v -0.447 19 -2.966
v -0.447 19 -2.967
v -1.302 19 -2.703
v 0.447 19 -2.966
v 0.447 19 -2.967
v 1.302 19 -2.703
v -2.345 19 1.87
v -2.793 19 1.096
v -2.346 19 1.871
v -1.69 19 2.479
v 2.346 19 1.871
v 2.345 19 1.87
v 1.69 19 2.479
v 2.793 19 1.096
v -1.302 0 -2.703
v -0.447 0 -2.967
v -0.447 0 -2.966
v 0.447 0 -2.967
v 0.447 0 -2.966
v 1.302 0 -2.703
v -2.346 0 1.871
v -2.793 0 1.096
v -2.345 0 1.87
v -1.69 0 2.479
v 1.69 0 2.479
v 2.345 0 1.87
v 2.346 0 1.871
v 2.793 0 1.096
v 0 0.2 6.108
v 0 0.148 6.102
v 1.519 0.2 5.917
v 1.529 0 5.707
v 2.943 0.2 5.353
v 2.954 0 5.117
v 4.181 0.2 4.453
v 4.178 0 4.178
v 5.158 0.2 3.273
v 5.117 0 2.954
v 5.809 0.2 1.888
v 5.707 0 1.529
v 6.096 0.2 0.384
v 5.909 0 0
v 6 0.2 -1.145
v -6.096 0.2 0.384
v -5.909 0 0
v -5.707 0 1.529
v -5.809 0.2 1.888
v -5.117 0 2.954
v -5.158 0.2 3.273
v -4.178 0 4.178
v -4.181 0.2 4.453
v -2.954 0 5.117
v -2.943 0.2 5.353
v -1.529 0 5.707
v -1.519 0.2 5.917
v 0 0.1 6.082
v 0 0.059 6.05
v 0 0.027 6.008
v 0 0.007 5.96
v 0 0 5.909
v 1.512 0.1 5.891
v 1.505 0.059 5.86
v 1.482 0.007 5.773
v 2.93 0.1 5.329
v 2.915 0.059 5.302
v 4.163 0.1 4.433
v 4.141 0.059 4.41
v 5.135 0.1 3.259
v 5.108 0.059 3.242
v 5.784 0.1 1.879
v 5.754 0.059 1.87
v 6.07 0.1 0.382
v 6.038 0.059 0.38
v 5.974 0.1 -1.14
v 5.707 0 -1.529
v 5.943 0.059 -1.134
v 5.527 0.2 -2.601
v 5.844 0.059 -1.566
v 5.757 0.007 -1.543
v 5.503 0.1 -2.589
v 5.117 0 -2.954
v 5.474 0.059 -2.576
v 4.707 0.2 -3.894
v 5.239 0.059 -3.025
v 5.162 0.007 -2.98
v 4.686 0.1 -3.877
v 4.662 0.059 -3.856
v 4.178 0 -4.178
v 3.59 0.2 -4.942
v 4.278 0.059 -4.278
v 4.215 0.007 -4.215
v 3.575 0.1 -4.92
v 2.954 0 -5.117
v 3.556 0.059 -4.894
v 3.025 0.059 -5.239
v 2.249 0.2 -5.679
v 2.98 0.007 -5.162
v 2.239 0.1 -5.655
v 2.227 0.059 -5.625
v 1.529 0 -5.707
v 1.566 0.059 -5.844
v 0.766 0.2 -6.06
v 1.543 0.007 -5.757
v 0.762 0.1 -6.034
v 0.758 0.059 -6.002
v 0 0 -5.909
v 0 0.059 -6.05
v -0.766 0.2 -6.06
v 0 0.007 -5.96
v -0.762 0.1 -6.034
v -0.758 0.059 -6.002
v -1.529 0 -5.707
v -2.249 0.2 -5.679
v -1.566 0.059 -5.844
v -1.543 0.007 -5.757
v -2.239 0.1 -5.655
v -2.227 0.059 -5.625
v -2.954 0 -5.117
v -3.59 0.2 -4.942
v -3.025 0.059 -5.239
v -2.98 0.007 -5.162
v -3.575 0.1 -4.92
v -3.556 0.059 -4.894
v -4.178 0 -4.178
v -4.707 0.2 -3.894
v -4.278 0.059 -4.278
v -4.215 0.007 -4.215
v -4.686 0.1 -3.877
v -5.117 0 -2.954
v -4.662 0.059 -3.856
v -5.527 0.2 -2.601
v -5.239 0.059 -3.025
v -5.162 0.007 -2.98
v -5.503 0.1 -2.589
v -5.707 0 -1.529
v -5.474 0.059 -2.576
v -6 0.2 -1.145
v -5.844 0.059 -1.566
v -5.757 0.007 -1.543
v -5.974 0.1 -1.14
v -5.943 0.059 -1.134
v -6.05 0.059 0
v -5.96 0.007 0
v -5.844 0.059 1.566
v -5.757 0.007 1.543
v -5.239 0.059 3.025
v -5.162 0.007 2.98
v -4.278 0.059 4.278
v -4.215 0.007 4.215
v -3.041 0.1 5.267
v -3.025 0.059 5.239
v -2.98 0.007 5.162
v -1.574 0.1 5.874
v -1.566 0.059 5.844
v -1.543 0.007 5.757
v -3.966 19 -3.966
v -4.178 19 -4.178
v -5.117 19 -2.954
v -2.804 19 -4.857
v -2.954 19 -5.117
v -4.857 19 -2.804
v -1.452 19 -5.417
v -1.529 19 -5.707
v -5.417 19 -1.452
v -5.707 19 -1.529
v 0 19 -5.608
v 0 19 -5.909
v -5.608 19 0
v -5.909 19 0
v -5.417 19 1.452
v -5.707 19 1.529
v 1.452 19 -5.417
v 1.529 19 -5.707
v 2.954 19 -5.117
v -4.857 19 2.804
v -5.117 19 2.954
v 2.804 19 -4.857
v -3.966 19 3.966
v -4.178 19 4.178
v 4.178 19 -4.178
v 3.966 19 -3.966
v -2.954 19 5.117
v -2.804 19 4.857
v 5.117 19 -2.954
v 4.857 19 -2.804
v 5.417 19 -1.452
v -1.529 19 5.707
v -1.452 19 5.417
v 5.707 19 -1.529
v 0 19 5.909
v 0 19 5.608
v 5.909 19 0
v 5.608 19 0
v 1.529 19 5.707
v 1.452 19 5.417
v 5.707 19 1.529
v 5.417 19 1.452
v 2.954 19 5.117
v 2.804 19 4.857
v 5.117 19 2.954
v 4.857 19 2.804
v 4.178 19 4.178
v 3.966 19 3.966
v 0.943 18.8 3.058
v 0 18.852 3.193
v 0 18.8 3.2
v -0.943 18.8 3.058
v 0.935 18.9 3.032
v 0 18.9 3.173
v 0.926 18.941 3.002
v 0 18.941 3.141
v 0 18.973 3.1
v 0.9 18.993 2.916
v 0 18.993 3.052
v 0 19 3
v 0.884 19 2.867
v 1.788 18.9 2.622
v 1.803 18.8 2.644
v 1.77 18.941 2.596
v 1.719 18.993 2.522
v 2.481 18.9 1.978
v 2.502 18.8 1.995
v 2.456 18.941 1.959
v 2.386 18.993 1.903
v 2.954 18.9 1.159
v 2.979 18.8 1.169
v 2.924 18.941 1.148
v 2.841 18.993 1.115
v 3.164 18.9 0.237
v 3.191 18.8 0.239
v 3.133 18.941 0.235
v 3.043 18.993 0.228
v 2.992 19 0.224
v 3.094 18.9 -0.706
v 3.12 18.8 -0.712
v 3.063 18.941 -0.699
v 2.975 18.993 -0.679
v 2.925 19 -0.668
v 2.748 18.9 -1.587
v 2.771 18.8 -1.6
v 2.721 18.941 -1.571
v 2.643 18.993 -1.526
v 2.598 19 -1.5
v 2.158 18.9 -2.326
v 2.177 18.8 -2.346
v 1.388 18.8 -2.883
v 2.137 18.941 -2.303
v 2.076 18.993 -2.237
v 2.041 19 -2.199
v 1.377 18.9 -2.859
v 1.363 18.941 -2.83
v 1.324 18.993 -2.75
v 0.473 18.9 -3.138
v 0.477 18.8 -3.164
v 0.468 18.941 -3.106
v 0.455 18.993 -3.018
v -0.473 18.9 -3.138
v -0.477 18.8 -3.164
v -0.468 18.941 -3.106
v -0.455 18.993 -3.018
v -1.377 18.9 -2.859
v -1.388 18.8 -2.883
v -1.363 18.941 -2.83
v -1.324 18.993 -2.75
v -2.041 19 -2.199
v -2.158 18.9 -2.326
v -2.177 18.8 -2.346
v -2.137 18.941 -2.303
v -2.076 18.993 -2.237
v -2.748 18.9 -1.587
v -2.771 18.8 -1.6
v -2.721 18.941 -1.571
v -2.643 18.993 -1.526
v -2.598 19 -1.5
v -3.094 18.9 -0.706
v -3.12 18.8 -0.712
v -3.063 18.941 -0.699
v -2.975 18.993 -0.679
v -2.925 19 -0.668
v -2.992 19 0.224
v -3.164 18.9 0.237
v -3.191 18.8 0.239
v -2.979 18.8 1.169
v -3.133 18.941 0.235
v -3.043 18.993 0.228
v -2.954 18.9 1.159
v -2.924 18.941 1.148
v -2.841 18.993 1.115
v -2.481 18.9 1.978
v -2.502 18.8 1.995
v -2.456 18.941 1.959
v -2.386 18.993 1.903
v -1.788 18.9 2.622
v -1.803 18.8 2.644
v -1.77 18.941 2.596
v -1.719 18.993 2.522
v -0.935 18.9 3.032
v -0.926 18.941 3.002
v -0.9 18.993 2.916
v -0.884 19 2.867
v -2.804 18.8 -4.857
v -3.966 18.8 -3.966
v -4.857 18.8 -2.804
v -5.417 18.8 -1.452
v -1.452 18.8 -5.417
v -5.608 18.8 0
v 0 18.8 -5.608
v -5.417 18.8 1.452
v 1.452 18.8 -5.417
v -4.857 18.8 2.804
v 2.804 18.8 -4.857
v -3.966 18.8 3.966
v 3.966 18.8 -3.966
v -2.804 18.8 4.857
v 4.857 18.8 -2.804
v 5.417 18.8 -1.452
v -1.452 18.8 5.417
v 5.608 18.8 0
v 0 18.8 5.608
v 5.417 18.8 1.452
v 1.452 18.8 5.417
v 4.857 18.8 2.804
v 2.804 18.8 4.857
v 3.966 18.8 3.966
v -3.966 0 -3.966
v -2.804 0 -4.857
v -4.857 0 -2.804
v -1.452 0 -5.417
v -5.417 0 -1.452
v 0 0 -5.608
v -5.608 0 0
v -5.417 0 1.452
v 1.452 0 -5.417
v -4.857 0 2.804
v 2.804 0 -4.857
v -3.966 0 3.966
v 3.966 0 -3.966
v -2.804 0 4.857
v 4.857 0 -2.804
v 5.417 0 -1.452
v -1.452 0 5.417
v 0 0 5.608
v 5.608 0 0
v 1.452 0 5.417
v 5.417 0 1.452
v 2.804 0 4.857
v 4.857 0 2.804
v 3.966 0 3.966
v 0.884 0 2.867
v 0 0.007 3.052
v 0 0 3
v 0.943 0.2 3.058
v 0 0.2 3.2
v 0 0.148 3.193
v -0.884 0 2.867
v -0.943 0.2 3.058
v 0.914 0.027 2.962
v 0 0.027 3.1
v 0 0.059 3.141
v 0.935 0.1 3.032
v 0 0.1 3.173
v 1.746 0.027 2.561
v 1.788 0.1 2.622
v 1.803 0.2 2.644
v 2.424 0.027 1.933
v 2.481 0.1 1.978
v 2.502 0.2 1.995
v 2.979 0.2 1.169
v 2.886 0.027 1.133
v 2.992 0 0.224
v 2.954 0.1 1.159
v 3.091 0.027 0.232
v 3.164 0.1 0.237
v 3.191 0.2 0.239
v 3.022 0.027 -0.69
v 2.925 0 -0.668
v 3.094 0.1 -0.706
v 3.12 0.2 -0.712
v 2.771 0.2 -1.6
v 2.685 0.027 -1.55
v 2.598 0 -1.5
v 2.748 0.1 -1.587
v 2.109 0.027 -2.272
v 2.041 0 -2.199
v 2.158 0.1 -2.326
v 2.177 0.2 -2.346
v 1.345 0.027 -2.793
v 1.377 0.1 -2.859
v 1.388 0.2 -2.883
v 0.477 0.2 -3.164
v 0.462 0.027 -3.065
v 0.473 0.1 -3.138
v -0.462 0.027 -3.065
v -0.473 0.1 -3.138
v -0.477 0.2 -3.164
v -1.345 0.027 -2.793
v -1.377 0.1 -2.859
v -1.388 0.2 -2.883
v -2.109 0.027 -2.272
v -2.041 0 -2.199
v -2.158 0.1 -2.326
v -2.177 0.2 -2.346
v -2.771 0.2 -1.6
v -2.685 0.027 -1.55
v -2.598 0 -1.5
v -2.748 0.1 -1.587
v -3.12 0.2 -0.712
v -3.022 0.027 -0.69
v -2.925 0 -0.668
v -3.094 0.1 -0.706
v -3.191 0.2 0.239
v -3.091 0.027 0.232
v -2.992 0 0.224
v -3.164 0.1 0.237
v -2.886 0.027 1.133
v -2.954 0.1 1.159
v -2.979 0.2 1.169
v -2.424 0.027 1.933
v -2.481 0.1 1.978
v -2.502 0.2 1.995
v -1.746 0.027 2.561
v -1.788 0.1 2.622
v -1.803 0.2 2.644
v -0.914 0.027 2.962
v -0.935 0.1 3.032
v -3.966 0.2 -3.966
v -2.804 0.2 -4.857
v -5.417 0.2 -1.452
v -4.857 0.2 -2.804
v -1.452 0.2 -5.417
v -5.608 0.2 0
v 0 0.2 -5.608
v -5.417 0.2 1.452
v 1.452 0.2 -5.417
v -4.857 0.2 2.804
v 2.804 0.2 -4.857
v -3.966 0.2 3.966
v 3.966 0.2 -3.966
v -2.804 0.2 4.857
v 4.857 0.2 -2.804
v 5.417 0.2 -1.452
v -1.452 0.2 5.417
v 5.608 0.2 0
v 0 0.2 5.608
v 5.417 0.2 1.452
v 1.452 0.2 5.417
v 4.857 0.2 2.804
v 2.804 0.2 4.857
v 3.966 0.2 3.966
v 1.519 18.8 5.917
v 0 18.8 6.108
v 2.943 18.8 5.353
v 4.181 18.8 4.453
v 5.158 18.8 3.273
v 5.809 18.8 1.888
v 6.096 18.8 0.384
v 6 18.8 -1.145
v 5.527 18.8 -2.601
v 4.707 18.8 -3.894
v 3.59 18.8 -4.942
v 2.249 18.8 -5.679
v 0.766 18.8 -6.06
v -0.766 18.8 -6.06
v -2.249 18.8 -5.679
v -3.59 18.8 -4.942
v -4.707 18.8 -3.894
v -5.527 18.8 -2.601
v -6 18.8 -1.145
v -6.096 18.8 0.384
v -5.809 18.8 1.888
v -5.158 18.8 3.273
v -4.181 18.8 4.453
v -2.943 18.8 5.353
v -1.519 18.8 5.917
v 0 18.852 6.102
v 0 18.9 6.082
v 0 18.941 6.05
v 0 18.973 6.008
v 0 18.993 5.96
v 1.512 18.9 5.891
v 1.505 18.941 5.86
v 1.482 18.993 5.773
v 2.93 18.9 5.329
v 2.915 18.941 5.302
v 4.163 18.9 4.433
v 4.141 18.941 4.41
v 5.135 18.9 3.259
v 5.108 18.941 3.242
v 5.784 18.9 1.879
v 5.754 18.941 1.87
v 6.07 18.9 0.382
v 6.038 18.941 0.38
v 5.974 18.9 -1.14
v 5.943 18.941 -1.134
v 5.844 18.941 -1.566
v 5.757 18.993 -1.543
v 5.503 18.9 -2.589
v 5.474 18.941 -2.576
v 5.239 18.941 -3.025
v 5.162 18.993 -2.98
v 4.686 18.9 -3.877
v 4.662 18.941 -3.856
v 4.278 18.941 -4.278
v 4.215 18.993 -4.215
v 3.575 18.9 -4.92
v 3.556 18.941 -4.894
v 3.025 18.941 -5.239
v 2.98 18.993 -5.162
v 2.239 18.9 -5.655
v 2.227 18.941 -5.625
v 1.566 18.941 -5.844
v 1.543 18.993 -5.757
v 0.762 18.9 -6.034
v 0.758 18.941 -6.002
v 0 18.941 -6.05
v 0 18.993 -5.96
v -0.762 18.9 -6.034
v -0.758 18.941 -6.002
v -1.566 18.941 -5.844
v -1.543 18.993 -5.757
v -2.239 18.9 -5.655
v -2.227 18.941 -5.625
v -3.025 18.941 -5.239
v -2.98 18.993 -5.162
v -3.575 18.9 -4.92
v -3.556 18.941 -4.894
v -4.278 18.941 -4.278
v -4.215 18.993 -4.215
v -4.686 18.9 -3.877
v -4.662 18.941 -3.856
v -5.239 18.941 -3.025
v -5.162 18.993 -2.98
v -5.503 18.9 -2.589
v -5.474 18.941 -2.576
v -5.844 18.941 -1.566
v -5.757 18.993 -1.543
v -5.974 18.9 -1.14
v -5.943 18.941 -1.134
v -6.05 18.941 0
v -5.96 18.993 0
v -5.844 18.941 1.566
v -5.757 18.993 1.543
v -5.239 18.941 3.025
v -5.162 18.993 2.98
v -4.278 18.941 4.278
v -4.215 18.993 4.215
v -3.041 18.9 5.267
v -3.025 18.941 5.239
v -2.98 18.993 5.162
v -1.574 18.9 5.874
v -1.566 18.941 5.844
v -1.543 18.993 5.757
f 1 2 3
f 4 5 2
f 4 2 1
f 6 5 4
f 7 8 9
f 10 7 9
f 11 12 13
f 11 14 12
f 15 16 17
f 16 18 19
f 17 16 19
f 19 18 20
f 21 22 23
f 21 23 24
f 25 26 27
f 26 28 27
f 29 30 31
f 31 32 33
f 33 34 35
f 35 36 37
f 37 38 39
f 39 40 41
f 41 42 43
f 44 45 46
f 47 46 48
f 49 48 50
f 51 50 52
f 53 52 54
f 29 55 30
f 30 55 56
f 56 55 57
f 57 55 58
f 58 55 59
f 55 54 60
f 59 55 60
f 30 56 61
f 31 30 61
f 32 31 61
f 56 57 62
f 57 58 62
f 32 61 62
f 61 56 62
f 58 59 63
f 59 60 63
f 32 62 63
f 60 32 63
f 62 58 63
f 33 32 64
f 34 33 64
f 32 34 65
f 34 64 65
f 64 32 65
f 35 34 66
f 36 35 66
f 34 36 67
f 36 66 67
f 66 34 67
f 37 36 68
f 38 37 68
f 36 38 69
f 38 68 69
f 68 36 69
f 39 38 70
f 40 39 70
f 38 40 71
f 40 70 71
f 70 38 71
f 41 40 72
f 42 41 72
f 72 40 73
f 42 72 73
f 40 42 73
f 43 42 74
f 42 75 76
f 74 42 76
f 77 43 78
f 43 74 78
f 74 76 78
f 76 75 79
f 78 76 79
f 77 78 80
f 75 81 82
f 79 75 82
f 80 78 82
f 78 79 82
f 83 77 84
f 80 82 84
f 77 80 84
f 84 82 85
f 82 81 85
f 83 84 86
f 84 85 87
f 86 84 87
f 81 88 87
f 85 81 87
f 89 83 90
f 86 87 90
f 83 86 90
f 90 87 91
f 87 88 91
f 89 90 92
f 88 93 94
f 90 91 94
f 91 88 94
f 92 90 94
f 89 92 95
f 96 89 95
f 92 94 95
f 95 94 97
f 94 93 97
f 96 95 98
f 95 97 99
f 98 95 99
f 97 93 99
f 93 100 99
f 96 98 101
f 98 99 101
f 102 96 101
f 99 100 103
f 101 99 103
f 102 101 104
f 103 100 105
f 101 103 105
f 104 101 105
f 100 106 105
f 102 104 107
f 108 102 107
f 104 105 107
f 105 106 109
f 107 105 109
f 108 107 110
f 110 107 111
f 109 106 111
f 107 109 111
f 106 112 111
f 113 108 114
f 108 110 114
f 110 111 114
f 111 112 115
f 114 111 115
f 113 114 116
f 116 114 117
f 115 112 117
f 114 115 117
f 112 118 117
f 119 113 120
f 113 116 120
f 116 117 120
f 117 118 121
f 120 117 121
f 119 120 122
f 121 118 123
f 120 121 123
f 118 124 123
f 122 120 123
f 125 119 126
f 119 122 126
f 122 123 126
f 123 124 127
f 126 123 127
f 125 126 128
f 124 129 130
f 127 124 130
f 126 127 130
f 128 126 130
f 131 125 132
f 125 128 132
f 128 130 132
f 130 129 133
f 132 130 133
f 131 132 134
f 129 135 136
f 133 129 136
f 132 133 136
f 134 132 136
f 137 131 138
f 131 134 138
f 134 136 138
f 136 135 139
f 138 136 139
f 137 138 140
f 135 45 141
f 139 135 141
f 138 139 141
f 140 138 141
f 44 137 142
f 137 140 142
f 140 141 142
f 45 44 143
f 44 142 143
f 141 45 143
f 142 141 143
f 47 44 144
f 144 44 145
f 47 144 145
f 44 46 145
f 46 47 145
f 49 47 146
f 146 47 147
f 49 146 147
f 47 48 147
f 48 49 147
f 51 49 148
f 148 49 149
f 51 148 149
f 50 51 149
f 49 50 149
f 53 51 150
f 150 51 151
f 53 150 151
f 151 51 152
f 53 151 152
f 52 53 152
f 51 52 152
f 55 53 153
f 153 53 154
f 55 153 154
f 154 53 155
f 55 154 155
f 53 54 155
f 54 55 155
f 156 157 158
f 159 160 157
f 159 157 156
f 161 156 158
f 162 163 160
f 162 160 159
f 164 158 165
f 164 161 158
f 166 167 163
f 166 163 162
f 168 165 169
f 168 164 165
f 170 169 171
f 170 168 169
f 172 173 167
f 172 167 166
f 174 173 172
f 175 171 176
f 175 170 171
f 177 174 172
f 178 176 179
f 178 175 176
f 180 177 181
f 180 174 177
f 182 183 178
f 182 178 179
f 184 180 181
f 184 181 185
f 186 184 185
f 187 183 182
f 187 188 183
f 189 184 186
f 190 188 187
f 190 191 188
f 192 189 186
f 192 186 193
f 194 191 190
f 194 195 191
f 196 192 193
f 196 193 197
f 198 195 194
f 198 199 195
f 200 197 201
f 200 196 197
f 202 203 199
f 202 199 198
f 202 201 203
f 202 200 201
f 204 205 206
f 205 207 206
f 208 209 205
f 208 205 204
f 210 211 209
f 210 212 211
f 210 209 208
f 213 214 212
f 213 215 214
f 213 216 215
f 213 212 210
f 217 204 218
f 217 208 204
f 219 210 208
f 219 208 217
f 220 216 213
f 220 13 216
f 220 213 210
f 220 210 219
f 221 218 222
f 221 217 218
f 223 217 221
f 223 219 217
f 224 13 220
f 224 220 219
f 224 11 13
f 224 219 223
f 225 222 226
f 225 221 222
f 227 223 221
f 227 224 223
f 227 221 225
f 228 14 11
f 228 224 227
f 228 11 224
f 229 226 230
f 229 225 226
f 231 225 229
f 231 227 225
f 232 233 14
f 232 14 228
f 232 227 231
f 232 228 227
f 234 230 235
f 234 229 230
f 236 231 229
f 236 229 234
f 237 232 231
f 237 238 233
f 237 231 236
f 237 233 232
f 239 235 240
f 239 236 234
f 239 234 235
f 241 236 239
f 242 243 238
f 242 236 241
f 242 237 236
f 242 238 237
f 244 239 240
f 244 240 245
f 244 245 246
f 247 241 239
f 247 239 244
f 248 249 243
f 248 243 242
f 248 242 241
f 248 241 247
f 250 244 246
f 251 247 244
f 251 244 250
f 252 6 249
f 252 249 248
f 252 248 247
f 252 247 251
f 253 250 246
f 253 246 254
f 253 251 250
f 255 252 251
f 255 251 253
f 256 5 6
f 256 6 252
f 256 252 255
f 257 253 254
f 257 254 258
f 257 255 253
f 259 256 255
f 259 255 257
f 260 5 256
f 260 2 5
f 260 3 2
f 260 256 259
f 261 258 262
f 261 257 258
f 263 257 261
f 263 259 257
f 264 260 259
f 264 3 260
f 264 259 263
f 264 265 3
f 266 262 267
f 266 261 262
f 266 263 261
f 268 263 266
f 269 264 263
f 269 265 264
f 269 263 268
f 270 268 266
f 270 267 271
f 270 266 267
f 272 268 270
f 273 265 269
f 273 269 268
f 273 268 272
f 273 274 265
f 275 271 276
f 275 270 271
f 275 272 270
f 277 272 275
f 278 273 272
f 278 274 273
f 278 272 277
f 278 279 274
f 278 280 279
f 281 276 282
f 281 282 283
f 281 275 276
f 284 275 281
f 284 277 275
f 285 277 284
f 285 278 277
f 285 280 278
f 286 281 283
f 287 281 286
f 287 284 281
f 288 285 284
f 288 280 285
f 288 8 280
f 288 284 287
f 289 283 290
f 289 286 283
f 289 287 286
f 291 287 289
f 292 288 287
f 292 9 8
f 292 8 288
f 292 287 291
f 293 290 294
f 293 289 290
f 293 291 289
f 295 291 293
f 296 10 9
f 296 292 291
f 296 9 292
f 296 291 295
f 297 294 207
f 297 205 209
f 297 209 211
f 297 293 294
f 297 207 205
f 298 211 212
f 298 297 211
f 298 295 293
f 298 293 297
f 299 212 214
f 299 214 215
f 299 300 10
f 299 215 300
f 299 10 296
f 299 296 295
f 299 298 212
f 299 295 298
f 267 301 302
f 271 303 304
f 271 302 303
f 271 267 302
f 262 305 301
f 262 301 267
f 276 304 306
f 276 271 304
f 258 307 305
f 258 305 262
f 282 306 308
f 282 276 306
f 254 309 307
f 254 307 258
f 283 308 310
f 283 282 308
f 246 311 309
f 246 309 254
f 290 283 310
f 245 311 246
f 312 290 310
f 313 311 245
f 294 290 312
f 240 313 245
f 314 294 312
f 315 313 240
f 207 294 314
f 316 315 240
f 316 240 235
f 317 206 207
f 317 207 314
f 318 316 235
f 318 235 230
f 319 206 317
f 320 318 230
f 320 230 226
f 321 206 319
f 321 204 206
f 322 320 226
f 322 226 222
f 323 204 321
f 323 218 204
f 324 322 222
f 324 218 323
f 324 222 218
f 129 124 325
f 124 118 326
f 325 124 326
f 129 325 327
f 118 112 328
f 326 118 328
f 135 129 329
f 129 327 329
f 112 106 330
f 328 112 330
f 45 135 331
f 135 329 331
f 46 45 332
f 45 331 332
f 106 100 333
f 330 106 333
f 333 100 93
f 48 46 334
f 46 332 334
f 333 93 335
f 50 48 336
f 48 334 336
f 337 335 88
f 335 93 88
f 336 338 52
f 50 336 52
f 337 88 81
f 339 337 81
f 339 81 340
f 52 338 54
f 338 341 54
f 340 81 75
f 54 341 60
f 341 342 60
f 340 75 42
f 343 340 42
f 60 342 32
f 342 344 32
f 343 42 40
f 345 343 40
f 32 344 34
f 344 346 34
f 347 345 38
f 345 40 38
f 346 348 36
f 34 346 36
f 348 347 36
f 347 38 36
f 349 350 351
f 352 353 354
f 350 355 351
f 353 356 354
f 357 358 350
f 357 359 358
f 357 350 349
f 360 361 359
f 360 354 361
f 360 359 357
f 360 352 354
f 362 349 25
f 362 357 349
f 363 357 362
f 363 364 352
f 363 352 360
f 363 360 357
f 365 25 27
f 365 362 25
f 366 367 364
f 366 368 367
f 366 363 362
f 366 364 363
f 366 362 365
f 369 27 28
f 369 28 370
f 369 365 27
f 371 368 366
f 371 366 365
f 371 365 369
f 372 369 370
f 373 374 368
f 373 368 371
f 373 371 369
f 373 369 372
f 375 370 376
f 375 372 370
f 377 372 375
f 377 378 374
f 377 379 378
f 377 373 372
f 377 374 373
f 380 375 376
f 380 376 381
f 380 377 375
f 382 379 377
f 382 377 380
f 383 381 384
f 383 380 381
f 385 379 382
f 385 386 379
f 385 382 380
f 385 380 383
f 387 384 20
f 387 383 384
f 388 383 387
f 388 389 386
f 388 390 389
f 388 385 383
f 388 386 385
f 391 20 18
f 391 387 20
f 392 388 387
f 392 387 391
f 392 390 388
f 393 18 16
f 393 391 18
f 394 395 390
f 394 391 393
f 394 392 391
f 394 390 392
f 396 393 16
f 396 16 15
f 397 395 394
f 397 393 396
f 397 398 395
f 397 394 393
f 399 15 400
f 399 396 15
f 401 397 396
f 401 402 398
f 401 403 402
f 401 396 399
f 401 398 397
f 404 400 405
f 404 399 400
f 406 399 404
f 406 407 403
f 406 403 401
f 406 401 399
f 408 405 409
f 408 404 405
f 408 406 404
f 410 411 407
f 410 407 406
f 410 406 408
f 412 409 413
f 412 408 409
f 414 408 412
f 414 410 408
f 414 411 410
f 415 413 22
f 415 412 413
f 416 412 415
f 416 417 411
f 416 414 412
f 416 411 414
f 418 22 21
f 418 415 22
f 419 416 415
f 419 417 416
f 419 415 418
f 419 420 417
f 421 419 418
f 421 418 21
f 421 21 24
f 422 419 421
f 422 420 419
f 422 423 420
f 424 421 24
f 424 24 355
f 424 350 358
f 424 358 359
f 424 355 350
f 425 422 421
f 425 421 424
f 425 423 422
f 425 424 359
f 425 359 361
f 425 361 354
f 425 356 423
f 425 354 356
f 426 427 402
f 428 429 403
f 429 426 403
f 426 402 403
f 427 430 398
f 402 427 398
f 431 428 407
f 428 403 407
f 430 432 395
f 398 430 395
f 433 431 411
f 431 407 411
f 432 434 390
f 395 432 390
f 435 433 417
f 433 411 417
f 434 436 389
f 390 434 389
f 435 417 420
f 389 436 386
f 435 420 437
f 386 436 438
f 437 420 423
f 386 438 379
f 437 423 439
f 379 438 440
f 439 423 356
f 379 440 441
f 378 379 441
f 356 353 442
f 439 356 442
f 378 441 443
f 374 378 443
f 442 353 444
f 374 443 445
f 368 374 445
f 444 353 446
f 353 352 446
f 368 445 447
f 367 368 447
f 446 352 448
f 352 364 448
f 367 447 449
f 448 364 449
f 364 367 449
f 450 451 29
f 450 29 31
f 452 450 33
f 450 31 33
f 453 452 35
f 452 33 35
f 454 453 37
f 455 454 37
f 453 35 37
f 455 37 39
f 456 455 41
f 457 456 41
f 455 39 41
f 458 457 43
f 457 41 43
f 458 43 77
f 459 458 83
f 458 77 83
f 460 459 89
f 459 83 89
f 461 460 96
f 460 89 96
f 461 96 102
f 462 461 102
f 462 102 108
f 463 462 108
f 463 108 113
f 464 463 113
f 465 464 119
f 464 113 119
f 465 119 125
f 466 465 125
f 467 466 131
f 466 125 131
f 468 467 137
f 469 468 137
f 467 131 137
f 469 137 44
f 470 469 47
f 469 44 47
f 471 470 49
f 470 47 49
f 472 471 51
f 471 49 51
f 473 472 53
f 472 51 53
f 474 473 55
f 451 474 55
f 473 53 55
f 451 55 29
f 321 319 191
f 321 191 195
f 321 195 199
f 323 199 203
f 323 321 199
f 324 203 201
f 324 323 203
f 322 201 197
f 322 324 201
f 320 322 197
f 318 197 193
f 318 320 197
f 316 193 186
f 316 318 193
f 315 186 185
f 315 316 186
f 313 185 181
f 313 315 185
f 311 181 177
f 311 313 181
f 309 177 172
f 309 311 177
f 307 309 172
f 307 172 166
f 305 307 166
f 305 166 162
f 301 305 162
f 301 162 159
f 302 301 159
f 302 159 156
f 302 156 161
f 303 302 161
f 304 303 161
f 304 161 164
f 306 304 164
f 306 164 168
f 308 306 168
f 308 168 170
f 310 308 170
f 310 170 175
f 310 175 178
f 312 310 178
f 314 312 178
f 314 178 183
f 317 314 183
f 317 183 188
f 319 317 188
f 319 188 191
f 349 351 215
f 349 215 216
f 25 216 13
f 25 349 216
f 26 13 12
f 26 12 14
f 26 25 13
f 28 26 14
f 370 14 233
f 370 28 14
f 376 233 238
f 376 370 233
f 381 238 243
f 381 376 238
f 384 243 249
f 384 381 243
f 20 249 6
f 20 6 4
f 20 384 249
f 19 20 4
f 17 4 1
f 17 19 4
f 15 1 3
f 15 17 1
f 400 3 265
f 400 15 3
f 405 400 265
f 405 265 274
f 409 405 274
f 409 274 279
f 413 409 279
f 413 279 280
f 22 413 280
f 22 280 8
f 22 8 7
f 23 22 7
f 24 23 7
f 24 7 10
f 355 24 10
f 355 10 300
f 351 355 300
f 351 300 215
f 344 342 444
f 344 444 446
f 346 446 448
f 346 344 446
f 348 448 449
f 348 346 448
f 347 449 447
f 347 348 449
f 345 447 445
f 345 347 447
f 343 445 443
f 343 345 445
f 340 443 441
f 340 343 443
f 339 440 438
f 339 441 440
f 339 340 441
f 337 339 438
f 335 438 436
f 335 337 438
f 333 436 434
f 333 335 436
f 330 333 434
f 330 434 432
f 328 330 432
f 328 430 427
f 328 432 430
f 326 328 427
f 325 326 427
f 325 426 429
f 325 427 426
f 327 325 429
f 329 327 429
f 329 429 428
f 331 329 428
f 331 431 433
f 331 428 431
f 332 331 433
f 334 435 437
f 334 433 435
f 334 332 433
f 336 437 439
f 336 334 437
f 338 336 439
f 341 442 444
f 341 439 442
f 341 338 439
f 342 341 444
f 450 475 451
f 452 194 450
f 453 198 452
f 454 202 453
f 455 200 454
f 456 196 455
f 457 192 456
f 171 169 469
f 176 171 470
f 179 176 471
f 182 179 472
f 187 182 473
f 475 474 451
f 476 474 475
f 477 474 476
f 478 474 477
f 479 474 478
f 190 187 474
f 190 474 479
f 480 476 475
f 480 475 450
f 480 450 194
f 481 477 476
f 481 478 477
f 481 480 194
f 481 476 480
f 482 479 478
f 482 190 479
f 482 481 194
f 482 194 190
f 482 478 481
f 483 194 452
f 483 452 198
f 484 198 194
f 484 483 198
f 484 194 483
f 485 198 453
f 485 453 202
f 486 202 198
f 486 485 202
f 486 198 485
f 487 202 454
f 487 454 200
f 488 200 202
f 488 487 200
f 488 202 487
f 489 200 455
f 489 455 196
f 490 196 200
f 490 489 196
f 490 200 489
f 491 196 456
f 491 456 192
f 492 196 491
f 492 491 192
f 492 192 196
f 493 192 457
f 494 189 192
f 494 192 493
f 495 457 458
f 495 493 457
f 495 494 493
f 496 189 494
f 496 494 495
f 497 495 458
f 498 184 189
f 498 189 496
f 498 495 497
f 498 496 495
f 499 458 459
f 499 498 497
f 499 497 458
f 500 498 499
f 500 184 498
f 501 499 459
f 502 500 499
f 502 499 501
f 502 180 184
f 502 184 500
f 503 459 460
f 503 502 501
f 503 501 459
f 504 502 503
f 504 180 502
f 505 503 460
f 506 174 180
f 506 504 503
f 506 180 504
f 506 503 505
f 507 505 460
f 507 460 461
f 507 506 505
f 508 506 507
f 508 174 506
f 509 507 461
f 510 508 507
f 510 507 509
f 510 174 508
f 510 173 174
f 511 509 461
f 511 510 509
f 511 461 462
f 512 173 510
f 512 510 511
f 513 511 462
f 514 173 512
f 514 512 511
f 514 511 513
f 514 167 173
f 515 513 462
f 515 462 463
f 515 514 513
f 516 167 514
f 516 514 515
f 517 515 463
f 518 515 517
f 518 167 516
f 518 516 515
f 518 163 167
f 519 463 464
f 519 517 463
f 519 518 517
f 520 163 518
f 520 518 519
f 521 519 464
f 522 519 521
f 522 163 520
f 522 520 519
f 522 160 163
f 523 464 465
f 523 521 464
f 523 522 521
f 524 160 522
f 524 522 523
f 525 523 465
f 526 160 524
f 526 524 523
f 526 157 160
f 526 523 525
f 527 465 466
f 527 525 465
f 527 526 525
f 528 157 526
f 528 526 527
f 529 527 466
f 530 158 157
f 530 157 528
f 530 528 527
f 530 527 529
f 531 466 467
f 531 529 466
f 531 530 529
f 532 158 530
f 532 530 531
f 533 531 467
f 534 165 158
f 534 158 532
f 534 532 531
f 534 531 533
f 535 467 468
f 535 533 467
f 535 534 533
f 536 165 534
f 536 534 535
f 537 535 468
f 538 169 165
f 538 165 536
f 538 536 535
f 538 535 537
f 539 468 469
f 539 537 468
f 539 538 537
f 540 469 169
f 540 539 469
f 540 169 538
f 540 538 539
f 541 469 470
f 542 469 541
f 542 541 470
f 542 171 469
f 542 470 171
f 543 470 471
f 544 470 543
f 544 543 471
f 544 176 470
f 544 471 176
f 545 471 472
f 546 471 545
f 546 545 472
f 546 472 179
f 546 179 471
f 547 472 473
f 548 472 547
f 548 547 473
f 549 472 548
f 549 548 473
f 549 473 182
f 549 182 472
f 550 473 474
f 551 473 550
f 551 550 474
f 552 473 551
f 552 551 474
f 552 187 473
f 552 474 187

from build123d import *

# Parameters (mm, degrees)
EXTRUDE_START   = 0.2
SKETCH_1_R      = 6
SKETCH_1_R_2    = 3
EXTRUDE_1_DEPTH = 18.6
SKETCH_2_R      = 6.108417227
SKETCH_2_R_2    = 5.608417227
SKETCH_2_R_3    = 3.2
SKETCH_2_R_4    = 3
EXTRUDE_2_DEPTH = 19
FILLET_1_R      = 0.2


with BuildPart() as part:
    # 草图1 → 凸台-拉伸1 (new body)
    with BuildSketch(Plane(origin=(0, 0, 0), x_dir=(1, 0, 0), z_dir=(0, 1, 0)).offset(EXTRUDE_START)):
        with Locations(Location((0, 0, 0), (0, 0, 270))):
            Circle(SKETCH_1_R)
        with Locations(Location((0, 0, 0), (0, 0, 270))):
            Circle(SKETCH_1_R_2, mode=Mode.SUBTRACT)
    extrude(amount=EXTRUDE_1_DEPTH)

    # 草图2 → 凸台-拉伸2 (add)
    # profile 1 of 2: a face of its own
    with BuildSketch(Plane(origin=(0, 0, 0), x_dir=(1, 0, 0), z_dir=(0, 1, 0))):
        with Locations(Location((0, 0, 0), (0, 0, 270))):
            Circle(SKETCH_2_R)
        with Locations(Location((0, 0, 0), (0, 0, 270))):
            Circle(SKETCH_2_R_2, mode=Mode.SUBTRACT)
    # profile 2 of 2: a face of its own
    with BuildSketch(Plane(origin=(0, 0, 0), x_dir=(1, 0, 0), z_dir=(0, 1, 0))):
        with Locations(Location((0, 0, 0), (0, 0, 270))):
            Circle(SKETCH_2_R_3)
        with Locations(Location((0, 0, 0), (0, 0, 270))):
            Circle(SKETCH_2_R_4, mode=Mode.SUBTRACT)
    extrude(amount=EXTRUDE_2_DEPTH)

    # 圆角1
    fillet_1_edges = [part.edges().sort_by_distance(p)[0] for p in [
        (0, 0, -6.108417227),
        (0, 19, -6.108417227),
        (0, 0, -3.2),
        (0, 19, -3.2),
    ]]
    fillet(fillet_1_edges, radius=FILLET_1_R - 0.0001)  # a hair under: the kernel refuses the full size


solid = part.part
